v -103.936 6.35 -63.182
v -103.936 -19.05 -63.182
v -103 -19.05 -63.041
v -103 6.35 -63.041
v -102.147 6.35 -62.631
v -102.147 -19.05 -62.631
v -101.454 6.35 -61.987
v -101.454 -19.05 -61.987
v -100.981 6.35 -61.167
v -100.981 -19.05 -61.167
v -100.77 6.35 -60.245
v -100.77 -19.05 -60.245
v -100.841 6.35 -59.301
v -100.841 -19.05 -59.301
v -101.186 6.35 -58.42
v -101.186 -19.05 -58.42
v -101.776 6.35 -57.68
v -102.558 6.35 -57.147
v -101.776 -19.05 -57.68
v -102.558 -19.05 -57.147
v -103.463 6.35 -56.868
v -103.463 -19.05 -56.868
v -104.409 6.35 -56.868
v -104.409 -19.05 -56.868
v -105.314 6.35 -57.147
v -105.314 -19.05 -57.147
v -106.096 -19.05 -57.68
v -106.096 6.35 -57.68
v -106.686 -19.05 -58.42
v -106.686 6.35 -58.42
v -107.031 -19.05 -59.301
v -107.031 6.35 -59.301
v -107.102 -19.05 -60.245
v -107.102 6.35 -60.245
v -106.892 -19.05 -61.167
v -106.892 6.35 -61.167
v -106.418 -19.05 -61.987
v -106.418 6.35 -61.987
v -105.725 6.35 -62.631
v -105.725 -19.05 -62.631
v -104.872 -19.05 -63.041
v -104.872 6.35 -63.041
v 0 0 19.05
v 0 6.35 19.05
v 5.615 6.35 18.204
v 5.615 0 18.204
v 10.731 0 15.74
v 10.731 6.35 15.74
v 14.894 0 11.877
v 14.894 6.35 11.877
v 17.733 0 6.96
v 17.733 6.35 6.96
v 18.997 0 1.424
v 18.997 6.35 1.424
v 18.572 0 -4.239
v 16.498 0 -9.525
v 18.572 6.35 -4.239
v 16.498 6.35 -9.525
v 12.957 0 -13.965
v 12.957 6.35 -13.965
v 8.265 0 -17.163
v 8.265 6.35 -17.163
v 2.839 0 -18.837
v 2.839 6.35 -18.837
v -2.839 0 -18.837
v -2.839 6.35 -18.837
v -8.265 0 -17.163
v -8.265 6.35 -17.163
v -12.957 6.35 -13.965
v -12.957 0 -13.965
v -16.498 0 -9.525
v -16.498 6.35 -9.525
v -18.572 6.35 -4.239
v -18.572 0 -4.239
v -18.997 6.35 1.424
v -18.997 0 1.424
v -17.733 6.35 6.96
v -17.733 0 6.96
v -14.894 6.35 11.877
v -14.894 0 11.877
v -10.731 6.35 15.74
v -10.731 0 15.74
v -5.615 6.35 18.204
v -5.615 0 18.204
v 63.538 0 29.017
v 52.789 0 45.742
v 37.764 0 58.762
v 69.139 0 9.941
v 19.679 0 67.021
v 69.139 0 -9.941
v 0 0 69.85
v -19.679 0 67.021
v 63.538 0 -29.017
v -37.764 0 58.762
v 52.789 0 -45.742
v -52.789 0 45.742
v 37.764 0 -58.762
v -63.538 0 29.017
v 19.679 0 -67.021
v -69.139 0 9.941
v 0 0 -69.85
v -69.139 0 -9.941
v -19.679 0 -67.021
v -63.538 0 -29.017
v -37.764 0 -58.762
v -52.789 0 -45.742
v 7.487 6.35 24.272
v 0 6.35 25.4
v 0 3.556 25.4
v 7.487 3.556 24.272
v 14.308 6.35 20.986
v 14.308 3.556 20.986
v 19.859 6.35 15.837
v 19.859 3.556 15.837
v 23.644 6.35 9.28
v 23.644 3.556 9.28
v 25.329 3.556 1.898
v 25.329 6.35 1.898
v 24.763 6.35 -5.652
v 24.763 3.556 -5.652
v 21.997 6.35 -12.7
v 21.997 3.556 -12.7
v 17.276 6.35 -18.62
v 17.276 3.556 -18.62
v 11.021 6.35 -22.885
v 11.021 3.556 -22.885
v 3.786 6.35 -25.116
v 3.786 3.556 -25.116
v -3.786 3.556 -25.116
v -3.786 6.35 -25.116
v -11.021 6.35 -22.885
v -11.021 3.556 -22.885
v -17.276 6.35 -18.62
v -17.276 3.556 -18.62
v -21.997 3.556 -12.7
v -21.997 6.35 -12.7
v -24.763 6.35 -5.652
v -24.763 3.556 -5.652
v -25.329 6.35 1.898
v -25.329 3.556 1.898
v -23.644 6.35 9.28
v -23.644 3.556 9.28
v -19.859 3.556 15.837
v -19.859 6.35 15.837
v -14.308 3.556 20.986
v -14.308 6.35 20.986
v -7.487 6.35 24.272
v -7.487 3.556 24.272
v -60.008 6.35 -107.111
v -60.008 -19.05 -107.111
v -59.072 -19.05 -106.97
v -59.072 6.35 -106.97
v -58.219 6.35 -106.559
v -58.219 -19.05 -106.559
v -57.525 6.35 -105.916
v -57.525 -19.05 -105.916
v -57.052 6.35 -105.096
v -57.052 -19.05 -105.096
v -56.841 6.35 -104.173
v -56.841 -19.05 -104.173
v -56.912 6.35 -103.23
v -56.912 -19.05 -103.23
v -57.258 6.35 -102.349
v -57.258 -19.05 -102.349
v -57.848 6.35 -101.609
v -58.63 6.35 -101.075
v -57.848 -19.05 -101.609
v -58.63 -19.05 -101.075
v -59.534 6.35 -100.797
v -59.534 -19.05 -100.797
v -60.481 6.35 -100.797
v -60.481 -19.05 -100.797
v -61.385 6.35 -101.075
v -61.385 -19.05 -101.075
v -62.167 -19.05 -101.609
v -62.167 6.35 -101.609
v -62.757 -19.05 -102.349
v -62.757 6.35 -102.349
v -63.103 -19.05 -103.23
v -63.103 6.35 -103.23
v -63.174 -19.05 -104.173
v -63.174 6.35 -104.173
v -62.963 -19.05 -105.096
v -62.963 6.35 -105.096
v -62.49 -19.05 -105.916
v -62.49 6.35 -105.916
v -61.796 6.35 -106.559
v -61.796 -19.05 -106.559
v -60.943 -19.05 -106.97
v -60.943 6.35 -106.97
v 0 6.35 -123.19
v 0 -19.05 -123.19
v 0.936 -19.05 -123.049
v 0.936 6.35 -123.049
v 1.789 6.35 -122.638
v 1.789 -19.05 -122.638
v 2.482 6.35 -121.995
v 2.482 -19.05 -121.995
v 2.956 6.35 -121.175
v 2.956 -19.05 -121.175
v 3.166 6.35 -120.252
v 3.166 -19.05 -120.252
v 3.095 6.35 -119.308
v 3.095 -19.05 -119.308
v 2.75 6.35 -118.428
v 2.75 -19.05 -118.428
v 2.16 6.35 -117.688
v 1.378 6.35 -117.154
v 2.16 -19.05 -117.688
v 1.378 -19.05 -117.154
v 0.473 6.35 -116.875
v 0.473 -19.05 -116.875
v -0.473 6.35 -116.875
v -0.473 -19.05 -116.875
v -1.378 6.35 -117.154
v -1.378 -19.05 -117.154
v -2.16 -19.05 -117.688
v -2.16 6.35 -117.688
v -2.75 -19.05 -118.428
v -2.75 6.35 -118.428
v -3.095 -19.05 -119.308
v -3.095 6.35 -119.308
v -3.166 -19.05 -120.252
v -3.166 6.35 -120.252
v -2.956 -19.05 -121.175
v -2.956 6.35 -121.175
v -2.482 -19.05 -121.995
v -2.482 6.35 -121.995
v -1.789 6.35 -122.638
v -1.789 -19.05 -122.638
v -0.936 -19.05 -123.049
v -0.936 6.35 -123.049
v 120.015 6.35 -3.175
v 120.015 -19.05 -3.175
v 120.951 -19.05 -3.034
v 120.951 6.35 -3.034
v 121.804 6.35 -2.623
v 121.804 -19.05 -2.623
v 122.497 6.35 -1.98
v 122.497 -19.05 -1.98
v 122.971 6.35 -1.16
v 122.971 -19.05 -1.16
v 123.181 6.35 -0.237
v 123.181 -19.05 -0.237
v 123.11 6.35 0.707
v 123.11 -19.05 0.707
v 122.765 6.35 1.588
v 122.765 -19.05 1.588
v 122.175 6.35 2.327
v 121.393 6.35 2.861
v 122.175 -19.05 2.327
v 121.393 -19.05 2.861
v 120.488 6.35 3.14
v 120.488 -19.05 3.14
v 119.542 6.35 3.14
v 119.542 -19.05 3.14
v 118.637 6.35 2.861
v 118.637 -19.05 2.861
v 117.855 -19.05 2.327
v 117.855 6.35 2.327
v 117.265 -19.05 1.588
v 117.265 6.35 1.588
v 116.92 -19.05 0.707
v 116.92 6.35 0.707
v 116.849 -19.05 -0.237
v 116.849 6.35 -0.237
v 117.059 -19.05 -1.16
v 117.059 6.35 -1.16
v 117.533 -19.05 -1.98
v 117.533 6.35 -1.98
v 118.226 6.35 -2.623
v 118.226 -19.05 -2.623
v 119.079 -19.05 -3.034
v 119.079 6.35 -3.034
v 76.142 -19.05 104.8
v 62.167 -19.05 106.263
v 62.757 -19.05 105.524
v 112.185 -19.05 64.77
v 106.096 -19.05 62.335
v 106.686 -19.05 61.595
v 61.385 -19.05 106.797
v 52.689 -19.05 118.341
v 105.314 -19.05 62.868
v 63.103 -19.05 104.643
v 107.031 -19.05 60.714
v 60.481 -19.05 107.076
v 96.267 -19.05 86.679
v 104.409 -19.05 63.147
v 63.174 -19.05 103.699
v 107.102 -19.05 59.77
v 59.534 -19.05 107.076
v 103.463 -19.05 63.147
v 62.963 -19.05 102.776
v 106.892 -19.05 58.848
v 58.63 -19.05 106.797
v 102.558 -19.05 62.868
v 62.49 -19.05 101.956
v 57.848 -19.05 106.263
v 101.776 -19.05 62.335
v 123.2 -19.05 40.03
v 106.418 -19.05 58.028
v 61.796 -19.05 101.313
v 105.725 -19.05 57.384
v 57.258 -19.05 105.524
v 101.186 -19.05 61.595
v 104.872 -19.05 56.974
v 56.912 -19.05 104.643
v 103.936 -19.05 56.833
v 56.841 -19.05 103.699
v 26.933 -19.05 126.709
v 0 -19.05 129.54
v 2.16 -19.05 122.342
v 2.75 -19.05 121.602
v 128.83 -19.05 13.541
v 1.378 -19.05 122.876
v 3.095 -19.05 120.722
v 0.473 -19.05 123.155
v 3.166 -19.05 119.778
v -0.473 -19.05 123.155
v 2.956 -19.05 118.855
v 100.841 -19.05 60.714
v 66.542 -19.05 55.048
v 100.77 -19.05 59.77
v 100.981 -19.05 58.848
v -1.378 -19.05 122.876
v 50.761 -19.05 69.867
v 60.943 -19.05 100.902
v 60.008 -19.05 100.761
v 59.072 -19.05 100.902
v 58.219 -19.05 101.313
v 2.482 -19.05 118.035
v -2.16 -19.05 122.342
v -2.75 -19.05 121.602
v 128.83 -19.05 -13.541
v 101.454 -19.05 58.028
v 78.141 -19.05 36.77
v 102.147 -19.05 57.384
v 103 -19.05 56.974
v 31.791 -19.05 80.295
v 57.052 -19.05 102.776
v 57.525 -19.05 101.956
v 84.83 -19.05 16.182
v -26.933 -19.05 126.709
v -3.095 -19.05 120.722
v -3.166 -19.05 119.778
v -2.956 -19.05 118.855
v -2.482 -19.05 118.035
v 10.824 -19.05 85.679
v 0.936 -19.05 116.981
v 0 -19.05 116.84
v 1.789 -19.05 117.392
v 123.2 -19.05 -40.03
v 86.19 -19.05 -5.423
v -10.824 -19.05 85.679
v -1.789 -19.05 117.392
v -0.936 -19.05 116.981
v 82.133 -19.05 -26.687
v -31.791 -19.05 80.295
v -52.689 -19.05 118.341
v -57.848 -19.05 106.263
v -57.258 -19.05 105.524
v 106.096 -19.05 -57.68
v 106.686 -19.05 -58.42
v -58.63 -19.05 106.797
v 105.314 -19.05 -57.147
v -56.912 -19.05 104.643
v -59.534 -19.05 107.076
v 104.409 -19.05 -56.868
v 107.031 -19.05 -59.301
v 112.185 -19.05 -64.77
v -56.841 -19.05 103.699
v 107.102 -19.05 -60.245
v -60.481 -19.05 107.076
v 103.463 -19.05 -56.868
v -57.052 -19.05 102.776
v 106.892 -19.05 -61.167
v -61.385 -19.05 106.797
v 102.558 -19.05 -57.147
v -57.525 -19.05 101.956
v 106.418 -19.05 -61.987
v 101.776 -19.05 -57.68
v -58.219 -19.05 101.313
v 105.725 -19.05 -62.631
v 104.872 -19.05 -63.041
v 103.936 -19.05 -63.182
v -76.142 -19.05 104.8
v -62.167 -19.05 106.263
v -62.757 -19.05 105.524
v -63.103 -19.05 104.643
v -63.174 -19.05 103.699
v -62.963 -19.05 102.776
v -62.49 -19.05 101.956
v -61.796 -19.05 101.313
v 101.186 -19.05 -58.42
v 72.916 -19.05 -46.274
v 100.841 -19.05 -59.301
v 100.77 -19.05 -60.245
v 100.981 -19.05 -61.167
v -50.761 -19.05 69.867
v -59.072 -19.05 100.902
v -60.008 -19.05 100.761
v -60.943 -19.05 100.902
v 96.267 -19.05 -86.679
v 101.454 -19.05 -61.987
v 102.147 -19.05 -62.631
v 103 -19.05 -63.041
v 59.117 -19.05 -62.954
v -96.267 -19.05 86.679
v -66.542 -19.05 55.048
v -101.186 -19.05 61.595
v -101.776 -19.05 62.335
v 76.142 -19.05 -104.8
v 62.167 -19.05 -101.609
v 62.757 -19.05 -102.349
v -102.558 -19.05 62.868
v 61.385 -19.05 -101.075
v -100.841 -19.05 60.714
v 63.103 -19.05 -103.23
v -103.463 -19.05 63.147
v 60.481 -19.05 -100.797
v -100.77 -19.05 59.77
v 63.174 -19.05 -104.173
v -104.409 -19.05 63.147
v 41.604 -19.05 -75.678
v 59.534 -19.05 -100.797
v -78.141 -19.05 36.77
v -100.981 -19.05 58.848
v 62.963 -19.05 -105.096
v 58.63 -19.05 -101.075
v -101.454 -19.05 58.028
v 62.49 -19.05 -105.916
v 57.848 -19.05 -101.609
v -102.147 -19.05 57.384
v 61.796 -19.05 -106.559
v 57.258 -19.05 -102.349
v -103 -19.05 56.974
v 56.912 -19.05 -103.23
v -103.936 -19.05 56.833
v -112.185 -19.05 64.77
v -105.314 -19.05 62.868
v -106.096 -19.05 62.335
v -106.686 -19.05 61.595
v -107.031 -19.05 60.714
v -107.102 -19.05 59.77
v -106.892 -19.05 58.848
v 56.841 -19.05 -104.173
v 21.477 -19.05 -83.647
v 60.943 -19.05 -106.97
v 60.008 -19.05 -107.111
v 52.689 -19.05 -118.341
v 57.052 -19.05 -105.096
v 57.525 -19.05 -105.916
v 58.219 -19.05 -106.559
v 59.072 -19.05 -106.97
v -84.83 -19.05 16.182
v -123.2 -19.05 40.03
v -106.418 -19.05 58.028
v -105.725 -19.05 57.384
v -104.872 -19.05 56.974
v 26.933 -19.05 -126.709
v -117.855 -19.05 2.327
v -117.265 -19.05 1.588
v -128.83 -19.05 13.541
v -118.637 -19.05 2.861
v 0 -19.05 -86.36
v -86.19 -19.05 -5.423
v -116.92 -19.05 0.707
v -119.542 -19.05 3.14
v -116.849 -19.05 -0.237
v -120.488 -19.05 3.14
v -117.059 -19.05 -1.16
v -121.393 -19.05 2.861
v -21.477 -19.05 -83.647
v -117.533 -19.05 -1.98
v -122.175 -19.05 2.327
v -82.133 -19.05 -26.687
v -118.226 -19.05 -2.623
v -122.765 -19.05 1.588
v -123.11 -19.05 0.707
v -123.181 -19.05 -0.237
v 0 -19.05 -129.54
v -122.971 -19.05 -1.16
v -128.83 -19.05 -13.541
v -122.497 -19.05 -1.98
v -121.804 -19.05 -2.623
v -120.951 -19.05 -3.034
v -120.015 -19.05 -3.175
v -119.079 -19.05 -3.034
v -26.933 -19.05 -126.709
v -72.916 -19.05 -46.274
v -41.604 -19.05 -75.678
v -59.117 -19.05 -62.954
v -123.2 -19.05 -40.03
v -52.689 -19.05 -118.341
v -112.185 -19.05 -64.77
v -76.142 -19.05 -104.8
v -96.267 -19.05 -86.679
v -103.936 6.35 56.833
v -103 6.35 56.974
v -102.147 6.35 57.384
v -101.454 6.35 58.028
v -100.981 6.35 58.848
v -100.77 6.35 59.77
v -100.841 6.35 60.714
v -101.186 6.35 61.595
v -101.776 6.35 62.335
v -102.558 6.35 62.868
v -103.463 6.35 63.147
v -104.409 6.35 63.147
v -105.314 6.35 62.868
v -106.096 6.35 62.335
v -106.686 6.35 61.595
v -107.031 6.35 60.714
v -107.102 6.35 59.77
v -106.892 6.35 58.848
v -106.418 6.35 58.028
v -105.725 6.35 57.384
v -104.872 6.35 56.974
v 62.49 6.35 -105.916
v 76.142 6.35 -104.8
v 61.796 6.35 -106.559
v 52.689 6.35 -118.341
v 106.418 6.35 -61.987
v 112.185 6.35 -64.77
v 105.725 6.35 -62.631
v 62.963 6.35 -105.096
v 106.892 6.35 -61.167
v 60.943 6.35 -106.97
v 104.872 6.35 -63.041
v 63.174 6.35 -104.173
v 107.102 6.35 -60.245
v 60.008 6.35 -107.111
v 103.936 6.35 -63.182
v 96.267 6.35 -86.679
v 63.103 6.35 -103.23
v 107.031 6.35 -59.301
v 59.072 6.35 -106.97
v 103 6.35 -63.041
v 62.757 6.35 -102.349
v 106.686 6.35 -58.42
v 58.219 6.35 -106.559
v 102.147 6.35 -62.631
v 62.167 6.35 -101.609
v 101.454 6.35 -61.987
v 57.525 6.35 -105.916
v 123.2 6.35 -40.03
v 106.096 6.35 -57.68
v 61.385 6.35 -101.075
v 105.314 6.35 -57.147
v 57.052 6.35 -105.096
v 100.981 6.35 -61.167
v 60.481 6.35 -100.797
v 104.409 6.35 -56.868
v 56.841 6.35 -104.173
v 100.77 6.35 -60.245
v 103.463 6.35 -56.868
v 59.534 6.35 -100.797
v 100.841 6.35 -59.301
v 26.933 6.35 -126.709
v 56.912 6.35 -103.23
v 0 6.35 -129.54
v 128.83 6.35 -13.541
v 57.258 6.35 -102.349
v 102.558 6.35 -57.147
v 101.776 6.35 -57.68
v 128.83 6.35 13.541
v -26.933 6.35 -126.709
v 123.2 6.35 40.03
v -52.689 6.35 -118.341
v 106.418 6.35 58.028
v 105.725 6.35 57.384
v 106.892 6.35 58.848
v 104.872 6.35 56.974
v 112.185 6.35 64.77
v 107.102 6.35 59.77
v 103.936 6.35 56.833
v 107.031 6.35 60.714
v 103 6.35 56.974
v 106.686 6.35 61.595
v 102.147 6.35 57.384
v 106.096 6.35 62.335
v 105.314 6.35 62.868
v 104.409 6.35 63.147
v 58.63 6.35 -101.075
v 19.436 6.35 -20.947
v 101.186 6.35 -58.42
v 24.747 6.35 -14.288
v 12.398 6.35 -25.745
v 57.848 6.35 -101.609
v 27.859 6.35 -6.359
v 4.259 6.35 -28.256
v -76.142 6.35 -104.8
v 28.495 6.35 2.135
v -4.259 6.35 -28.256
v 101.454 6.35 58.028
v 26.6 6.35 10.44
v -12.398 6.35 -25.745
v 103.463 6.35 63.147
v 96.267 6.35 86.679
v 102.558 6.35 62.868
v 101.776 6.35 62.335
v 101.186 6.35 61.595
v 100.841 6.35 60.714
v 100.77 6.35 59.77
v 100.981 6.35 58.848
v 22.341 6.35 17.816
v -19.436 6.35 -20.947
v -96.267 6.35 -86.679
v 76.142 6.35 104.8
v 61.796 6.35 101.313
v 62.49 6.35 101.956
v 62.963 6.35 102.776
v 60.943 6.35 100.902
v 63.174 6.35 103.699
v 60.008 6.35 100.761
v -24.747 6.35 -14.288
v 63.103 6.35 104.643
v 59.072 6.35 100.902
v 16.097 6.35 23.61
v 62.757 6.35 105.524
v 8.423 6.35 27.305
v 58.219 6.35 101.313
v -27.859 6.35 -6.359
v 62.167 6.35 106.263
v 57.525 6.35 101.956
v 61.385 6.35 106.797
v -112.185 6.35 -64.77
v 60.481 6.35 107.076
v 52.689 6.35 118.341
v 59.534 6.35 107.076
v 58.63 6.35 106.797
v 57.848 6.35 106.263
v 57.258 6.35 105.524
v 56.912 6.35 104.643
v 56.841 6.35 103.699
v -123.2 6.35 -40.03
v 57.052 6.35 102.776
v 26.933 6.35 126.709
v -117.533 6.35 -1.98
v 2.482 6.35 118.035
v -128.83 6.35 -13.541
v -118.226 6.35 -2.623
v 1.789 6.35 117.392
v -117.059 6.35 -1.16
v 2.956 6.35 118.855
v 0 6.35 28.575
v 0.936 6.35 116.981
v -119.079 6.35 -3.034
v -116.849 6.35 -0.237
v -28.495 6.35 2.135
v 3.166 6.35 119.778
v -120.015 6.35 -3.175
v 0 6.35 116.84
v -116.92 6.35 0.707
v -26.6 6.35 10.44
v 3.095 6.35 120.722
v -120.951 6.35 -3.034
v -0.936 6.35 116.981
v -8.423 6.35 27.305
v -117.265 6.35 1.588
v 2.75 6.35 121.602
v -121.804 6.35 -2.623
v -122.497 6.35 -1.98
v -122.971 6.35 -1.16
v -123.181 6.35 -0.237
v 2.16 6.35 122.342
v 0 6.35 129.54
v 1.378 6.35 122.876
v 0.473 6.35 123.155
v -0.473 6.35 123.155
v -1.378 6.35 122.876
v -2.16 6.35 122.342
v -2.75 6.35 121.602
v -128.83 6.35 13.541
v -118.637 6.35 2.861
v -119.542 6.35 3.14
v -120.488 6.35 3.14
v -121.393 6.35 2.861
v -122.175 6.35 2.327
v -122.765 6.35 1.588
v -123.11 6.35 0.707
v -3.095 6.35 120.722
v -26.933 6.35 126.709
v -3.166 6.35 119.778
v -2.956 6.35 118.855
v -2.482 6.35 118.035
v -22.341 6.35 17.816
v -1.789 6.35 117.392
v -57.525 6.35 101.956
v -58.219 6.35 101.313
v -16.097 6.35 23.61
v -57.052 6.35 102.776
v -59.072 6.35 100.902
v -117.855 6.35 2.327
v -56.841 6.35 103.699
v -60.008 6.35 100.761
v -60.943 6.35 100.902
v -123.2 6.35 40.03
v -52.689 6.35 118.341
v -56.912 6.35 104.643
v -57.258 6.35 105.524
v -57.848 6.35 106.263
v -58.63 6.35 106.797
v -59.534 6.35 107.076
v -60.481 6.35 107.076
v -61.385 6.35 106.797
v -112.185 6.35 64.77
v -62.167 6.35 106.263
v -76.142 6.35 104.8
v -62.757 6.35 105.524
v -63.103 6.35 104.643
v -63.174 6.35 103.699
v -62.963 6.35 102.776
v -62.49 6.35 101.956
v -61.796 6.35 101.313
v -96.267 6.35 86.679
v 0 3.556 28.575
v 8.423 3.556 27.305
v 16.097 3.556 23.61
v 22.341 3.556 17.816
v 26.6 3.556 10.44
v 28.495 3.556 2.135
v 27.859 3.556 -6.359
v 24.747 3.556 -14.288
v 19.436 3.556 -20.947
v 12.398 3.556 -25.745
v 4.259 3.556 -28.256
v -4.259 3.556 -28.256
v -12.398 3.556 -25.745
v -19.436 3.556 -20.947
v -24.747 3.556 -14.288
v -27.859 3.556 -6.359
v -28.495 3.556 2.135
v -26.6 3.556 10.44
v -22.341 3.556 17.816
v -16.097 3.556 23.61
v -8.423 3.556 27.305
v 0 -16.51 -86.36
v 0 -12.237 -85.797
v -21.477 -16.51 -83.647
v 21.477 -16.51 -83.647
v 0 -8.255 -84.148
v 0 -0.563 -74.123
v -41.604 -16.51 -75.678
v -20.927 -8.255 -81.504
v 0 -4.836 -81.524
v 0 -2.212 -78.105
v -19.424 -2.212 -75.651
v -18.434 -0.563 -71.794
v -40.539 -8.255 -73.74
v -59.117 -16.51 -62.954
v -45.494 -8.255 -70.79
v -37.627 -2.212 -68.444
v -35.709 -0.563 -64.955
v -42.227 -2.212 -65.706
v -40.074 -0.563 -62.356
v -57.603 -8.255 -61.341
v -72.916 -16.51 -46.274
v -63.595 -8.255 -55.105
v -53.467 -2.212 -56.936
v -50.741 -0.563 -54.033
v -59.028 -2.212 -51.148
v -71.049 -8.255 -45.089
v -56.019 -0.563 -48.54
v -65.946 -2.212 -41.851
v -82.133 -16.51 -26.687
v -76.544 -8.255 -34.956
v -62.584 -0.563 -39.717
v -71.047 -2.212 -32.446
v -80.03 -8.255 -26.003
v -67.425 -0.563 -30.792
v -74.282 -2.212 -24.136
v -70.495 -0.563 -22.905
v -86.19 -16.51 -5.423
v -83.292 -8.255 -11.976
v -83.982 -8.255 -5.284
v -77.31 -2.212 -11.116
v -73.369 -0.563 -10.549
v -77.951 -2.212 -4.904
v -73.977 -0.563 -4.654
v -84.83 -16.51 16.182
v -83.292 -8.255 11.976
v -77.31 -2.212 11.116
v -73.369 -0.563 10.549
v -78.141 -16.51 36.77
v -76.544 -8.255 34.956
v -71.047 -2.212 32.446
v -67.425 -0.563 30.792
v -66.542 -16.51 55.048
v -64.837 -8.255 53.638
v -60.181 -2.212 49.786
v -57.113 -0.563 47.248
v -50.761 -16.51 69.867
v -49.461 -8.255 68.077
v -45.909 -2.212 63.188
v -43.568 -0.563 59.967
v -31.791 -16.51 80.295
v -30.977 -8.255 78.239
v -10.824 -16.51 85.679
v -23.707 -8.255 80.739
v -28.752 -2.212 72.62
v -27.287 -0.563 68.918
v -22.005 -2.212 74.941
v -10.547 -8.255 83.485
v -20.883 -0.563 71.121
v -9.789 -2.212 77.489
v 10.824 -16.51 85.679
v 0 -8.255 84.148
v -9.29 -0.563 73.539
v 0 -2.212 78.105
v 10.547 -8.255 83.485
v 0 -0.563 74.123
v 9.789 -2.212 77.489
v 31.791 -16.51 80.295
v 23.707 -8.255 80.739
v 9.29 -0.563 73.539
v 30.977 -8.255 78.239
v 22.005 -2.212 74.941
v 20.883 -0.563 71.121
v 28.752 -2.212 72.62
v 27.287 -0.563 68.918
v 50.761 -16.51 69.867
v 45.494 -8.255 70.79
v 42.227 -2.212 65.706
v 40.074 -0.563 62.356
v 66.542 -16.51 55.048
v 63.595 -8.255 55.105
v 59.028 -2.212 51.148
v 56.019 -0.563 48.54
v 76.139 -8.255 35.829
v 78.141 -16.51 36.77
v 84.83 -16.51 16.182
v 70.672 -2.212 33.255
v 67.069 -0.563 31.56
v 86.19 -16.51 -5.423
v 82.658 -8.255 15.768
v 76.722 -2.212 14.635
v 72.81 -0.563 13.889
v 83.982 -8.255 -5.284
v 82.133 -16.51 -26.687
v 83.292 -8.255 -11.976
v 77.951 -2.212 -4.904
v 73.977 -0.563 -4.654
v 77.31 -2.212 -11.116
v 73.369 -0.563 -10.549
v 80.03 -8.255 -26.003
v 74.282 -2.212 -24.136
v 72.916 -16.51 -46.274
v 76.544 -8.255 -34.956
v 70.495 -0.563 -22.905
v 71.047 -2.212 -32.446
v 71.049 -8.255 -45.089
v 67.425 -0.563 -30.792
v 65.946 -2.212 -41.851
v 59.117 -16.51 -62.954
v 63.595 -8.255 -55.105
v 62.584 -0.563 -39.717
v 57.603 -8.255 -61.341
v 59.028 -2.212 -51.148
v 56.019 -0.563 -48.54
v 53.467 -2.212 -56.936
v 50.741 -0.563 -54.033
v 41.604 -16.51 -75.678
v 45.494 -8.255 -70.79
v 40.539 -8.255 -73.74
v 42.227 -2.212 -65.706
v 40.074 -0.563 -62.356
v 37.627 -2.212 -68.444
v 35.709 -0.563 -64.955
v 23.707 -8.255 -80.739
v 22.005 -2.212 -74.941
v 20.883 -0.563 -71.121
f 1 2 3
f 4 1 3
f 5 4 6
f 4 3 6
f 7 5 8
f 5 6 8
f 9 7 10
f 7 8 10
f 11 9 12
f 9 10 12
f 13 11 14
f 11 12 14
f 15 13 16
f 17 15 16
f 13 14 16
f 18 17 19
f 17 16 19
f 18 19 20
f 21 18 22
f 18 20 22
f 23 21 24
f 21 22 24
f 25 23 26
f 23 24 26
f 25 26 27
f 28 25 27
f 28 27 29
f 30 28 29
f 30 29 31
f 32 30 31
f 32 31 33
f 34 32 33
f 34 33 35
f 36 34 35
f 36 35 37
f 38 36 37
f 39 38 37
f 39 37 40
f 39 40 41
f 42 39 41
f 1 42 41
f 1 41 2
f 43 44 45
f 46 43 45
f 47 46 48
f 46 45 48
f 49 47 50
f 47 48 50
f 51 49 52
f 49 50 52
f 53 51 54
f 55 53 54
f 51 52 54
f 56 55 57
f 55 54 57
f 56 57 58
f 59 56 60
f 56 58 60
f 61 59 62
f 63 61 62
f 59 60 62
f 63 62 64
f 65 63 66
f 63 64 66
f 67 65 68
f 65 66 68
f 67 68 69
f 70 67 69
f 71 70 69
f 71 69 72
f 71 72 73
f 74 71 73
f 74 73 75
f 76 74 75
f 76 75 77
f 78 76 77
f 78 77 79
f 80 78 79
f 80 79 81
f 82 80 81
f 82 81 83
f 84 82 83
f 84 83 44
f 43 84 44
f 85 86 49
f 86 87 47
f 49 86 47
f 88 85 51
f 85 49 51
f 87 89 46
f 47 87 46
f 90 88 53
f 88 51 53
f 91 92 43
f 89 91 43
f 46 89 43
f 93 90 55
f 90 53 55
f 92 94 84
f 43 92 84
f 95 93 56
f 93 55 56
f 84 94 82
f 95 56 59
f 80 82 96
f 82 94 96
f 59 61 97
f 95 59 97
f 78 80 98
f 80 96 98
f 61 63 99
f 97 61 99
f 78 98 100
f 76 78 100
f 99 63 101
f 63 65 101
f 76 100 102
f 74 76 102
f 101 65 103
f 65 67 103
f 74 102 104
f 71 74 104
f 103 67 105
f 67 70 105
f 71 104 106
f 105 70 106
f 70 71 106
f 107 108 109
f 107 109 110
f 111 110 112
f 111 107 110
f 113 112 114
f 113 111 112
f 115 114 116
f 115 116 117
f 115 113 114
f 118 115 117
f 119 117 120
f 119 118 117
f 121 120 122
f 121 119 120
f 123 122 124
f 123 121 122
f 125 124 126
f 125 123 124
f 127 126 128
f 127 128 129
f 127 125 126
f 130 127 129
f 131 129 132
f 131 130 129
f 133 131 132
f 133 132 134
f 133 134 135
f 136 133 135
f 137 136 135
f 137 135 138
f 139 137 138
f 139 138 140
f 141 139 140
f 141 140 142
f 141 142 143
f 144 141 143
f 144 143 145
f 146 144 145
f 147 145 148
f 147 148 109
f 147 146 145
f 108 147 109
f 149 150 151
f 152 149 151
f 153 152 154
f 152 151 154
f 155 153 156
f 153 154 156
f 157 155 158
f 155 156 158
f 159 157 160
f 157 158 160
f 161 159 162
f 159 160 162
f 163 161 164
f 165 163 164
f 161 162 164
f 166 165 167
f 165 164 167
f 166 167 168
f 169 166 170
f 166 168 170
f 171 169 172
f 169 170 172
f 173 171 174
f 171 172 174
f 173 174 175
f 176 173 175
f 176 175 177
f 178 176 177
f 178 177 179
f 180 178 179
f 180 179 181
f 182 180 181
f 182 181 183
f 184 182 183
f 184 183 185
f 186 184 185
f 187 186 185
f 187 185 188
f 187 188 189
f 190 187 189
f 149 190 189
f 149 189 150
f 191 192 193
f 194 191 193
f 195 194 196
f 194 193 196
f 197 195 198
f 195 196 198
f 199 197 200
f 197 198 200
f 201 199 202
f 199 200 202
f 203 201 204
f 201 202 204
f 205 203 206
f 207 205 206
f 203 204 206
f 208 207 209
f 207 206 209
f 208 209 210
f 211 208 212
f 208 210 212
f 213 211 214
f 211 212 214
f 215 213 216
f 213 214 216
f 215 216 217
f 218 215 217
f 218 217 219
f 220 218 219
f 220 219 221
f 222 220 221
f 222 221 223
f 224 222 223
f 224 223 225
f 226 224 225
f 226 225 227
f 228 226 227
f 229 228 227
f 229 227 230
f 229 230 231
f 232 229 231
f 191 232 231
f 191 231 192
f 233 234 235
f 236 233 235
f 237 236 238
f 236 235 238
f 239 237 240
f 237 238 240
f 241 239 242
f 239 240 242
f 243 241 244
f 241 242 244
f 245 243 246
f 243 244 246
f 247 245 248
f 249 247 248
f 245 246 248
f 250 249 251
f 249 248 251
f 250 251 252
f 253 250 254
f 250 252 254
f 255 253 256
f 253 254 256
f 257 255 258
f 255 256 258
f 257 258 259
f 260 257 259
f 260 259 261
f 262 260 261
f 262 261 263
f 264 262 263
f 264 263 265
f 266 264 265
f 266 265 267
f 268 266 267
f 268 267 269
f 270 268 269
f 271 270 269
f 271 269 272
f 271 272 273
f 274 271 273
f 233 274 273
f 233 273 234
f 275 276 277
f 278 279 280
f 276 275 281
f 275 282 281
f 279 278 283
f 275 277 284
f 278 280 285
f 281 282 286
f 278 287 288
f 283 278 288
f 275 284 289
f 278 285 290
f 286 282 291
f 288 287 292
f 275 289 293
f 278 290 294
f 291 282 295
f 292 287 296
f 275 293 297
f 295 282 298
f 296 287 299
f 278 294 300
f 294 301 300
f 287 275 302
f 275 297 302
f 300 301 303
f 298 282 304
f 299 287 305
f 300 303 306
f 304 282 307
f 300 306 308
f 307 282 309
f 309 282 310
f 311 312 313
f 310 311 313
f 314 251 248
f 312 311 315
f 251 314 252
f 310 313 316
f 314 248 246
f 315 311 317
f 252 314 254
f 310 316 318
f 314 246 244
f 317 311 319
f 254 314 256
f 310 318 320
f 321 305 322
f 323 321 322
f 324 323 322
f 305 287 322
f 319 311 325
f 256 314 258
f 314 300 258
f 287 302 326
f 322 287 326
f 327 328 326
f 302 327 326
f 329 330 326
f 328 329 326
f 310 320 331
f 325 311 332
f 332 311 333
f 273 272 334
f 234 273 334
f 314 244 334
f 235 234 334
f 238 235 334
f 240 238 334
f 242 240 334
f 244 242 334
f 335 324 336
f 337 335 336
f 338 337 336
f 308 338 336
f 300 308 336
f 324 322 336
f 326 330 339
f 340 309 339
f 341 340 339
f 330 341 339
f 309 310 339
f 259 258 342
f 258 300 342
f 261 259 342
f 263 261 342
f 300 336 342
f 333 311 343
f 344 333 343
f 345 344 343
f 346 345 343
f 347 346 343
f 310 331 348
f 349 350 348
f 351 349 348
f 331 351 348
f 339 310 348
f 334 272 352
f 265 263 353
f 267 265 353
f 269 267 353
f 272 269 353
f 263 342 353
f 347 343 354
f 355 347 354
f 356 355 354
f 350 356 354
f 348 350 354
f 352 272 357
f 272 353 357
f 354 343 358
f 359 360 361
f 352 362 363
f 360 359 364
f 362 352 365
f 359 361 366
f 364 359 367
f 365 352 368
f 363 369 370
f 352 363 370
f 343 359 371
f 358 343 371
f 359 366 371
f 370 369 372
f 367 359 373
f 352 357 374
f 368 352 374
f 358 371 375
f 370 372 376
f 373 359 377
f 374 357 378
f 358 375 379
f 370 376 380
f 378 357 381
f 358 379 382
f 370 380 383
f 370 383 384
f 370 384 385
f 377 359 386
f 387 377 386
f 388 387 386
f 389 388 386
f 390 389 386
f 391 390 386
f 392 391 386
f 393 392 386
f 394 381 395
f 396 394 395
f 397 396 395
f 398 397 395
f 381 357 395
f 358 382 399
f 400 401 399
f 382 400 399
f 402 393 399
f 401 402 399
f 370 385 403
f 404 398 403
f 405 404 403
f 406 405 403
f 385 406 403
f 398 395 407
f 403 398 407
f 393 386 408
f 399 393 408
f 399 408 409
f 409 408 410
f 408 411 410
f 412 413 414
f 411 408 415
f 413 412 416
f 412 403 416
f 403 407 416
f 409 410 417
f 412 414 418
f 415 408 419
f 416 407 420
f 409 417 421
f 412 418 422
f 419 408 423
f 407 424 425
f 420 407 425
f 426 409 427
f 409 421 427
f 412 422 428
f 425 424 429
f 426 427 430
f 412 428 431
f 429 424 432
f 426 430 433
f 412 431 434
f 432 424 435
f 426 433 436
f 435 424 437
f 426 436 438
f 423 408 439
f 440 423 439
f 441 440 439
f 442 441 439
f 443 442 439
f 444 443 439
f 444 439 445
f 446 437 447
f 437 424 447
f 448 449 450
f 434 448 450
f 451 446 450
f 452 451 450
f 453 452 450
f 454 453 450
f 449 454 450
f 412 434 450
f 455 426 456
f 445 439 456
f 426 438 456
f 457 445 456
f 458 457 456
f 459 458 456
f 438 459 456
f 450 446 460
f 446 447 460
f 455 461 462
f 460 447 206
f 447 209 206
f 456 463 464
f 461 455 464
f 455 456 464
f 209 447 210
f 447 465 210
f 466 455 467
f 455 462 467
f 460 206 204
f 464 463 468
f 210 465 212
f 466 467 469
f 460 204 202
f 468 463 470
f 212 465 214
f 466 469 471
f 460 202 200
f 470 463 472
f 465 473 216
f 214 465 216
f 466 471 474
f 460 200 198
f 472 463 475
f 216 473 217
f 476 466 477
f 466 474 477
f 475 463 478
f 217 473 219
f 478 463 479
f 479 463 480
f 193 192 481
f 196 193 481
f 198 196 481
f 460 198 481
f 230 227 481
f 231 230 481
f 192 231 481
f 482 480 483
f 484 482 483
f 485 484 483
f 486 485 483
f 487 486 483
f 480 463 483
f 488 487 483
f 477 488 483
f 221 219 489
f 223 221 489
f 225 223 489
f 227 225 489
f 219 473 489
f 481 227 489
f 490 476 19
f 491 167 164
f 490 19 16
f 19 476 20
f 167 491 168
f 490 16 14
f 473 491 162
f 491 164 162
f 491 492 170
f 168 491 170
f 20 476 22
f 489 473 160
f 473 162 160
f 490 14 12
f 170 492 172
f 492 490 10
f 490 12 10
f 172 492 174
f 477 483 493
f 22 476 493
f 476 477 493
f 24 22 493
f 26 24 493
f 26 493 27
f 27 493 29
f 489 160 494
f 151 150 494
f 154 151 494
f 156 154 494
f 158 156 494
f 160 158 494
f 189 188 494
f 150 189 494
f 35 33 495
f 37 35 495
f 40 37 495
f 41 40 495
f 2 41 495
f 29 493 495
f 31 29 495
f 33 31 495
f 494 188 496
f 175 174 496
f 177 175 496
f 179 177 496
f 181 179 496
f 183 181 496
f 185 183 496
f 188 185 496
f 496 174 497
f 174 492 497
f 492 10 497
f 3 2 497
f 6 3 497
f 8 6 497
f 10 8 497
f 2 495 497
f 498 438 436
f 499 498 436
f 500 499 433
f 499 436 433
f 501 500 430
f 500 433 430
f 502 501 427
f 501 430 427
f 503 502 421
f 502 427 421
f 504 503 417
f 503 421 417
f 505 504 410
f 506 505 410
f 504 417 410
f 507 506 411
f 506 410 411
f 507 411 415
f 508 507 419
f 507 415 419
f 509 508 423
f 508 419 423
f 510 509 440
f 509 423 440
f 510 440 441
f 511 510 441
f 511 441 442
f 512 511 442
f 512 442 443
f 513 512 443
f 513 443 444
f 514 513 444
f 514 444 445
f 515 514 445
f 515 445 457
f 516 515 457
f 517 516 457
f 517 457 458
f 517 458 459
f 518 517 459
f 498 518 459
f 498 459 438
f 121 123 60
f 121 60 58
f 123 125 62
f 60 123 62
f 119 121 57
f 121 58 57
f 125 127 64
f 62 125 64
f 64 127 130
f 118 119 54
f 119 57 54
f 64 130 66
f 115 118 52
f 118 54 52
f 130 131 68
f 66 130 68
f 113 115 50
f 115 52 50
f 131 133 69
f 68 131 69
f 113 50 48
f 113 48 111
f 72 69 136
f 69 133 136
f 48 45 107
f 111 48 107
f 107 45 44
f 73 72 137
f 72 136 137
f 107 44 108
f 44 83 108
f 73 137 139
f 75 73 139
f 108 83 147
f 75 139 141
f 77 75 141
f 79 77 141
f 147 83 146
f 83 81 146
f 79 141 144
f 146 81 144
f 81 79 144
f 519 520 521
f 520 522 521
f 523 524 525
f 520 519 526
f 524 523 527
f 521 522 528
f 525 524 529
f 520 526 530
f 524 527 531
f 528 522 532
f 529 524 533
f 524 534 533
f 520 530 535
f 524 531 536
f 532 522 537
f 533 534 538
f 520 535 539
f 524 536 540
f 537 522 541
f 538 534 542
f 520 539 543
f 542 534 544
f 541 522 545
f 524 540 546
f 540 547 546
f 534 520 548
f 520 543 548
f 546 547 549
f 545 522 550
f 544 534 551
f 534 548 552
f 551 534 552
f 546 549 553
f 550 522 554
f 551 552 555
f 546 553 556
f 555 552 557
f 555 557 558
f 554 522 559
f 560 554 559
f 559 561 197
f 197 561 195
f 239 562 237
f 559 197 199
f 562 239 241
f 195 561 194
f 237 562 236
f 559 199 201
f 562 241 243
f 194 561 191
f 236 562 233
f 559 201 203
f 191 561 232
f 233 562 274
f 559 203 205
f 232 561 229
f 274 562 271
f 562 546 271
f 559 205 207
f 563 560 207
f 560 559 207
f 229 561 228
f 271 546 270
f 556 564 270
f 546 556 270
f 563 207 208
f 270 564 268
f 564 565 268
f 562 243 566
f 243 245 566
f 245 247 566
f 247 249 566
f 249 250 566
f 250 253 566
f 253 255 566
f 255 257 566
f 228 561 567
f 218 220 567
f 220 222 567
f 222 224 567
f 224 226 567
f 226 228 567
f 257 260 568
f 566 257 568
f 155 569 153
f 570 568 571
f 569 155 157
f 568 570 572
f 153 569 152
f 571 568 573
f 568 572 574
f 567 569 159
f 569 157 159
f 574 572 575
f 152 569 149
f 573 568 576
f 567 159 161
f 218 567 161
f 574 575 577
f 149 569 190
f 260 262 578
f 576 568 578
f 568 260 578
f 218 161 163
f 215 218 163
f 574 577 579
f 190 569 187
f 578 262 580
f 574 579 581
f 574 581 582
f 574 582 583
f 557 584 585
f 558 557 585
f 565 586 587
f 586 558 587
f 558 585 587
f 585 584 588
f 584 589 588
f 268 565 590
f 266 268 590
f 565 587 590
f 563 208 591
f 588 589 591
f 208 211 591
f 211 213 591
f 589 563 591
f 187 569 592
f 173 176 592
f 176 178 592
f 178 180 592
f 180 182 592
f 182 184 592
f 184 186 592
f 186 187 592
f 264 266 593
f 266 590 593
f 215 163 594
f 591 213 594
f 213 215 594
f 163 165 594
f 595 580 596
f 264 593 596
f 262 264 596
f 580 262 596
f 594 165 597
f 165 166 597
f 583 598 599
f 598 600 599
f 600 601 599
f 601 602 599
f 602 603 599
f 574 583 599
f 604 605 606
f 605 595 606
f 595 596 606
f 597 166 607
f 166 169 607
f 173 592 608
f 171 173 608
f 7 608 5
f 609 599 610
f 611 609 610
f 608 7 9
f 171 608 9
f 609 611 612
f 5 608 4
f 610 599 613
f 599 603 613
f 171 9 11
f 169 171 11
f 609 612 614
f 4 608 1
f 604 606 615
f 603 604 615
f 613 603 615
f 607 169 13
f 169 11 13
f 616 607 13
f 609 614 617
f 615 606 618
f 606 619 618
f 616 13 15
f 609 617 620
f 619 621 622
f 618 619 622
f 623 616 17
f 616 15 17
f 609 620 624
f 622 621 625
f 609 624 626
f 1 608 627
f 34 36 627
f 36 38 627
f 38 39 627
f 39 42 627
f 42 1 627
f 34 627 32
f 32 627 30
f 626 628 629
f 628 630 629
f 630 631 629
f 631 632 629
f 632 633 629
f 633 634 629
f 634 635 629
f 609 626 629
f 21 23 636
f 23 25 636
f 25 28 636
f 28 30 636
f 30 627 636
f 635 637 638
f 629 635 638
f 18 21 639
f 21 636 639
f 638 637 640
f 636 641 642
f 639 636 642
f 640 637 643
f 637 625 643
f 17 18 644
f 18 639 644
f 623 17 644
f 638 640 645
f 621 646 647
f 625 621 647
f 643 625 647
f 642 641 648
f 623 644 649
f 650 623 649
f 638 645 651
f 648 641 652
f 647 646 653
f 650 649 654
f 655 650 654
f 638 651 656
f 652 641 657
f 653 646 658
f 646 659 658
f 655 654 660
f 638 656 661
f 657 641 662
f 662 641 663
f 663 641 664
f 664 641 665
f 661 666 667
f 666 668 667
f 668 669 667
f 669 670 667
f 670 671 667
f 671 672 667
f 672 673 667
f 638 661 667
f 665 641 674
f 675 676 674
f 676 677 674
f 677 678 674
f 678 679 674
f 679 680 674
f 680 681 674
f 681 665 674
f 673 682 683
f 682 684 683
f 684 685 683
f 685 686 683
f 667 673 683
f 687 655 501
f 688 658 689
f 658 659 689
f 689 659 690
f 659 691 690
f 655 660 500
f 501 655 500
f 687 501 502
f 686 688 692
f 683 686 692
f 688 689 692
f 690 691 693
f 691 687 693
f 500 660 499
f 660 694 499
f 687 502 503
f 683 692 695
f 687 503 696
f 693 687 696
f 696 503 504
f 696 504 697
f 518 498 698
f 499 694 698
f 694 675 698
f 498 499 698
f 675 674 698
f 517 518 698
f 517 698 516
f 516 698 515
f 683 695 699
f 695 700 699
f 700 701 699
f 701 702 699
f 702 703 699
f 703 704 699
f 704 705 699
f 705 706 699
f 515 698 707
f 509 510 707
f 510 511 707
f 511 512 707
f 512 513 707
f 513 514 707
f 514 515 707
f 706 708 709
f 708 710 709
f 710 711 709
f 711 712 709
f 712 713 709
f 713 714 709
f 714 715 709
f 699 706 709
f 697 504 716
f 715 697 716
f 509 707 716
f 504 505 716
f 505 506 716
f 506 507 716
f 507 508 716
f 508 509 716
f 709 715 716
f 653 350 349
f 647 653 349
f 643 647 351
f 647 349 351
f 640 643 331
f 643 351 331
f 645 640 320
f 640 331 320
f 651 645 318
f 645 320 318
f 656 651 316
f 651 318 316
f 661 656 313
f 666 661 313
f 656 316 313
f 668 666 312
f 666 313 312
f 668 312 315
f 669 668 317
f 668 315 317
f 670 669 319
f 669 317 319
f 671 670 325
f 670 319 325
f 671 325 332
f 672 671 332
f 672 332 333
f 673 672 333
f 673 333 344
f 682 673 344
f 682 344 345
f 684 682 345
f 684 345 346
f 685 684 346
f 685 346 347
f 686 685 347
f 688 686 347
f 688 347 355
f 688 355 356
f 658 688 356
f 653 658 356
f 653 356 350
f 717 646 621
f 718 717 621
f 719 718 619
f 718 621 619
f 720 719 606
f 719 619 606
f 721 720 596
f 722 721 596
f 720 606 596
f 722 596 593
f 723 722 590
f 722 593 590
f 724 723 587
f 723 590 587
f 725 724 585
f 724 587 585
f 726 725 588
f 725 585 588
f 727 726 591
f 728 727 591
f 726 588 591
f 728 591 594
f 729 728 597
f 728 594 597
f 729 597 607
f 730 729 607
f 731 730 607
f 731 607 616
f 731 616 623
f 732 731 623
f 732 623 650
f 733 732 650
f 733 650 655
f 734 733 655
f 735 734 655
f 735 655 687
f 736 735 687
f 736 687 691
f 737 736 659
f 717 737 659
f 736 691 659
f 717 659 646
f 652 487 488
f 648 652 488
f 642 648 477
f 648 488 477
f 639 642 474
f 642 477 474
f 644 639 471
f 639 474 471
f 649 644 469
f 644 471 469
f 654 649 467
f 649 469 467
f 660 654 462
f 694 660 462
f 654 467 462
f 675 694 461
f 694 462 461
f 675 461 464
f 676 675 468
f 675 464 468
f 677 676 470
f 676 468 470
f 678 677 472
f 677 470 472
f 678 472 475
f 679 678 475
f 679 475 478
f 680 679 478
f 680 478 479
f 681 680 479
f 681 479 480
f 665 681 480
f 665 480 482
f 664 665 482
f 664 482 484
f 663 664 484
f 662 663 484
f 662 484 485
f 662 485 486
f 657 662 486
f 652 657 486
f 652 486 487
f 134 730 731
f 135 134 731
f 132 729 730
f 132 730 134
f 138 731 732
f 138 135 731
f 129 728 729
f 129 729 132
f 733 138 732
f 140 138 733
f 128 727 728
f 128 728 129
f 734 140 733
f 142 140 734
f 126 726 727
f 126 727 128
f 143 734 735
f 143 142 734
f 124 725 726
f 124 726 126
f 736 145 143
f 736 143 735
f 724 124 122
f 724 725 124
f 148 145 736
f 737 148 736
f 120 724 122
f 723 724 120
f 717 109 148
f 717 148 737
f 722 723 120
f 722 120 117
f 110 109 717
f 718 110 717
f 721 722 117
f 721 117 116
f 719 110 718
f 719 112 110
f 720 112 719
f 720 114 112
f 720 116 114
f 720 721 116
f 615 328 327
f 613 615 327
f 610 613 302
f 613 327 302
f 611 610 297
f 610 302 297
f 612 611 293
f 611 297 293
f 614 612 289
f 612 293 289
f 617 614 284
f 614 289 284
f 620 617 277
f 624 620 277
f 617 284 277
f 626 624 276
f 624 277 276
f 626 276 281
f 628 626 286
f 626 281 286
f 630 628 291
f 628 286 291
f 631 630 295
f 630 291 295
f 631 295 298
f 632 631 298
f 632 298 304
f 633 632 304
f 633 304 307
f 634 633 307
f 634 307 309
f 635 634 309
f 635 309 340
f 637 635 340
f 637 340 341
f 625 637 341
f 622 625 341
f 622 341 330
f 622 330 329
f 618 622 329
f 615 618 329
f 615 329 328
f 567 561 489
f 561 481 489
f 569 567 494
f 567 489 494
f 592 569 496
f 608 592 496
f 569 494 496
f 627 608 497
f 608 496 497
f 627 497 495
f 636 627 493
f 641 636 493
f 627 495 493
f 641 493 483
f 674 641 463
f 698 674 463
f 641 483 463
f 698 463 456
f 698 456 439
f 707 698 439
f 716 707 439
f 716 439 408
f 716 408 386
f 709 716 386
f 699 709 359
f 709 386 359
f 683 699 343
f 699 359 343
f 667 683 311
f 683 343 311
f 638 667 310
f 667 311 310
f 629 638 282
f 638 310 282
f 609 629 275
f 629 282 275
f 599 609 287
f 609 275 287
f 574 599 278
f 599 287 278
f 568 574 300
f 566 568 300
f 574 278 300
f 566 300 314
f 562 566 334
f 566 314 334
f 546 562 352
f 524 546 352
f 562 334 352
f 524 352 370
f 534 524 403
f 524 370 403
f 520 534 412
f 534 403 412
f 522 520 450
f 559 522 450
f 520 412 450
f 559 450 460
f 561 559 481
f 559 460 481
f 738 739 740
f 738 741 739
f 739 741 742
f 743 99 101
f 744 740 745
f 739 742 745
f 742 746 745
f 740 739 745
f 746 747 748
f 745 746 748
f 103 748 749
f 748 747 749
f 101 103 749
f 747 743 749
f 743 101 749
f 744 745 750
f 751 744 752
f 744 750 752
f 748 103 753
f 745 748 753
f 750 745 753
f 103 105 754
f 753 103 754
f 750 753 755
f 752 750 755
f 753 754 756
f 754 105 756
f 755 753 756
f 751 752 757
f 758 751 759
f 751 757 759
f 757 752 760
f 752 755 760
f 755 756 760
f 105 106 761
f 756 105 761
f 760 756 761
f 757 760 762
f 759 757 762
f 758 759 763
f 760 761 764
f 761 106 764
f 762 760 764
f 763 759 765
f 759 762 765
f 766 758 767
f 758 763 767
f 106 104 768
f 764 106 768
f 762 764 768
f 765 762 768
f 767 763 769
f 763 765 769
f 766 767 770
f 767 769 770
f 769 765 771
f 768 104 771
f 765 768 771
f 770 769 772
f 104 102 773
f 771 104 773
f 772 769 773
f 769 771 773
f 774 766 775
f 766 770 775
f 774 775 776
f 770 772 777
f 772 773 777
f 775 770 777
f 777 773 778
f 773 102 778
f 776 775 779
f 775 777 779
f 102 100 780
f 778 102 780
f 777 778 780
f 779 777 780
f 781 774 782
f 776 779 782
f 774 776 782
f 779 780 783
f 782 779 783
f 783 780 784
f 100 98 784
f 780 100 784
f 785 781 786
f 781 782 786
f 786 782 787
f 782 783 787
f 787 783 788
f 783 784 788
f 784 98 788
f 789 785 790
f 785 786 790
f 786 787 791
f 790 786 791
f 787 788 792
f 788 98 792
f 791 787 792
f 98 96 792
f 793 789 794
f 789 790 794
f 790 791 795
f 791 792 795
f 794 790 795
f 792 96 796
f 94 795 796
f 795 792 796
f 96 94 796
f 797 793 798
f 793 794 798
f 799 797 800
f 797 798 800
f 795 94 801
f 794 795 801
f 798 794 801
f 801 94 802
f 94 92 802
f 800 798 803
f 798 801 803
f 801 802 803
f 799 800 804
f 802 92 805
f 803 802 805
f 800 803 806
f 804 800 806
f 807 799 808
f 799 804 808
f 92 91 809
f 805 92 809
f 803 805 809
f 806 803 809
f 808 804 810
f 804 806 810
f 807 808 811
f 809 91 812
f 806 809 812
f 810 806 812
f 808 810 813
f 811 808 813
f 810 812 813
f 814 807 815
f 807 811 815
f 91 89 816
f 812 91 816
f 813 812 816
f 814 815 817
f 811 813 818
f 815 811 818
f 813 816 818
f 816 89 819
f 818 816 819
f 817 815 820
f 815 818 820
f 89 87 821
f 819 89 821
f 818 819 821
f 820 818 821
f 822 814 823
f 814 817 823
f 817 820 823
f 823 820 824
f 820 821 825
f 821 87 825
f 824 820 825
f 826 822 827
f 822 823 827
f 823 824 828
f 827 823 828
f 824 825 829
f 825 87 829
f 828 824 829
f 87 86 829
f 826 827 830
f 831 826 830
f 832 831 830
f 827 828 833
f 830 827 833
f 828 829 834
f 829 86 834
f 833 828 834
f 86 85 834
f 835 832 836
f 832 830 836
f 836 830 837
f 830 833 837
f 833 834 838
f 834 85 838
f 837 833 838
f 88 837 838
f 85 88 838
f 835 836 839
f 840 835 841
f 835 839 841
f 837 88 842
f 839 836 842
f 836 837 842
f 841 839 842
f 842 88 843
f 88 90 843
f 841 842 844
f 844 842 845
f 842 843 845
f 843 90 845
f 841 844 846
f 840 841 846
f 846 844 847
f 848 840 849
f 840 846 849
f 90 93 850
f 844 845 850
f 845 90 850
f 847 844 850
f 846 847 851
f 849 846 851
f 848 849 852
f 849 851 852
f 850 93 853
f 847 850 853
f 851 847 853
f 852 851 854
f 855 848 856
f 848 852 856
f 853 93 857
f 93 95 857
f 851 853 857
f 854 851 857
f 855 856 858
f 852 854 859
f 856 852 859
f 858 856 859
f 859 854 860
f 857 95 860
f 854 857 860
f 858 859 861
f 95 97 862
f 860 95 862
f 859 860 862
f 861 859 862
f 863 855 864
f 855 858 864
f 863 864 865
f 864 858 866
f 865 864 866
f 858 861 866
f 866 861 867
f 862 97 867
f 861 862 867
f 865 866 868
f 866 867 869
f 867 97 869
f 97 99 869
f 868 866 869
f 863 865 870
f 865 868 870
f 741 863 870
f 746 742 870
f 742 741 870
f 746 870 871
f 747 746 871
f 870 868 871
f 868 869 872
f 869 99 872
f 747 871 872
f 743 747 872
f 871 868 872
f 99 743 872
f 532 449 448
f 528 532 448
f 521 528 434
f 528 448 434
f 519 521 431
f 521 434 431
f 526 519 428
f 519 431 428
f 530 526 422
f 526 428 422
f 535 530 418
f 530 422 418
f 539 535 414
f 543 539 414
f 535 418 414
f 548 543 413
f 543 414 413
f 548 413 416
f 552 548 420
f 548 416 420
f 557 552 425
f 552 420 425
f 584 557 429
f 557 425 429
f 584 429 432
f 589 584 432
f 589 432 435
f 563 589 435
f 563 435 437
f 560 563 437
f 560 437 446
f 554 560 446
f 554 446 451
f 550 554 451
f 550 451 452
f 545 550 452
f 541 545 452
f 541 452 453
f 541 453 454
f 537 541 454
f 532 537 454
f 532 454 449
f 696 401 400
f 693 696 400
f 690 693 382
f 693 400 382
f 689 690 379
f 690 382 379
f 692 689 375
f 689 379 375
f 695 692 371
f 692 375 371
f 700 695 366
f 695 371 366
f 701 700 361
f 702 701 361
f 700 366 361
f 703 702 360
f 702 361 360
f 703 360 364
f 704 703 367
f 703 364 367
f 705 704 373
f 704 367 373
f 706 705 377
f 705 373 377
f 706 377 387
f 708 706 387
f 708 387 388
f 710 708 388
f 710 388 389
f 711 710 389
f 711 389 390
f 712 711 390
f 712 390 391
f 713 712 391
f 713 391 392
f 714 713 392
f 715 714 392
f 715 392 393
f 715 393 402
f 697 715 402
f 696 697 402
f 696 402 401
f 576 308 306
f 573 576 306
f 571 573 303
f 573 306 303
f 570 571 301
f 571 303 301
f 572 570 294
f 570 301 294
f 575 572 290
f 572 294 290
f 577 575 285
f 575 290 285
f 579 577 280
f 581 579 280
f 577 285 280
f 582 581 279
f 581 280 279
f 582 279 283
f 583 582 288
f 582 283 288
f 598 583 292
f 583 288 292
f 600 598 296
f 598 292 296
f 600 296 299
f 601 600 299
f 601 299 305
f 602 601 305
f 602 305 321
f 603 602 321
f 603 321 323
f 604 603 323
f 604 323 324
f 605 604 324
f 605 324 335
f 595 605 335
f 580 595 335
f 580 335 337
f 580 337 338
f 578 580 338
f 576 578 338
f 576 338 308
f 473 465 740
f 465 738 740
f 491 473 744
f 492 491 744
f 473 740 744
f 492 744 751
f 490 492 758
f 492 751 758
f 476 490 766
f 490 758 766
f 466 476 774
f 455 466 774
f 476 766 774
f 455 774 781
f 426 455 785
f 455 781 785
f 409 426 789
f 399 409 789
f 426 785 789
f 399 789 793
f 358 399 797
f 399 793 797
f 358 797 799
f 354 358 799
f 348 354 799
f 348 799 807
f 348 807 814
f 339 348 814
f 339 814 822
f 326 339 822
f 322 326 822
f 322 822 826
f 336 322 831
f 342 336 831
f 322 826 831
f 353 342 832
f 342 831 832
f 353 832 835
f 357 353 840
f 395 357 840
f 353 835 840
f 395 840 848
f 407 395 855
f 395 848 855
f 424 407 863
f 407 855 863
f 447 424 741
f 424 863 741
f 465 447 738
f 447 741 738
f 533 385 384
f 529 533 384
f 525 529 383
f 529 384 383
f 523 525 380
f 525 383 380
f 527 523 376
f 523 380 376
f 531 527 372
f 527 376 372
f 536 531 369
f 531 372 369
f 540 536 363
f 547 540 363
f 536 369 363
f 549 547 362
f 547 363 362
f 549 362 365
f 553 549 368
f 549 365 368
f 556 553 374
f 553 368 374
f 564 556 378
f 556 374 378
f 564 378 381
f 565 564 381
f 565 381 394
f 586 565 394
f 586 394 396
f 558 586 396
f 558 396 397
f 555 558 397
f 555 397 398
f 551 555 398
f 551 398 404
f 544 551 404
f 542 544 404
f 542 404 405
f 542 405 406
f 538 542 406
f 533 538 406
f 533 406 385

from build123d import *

# Parameters (mm, degrees)
SKETCH2_R                   = 19.05
CUT_EXTRUDE1_DEPTH          = 185.94967748
SKETCH3_R                   = 28.575
SKETCH3_R_2                 = 25.4
CUT_EXTRUDE2_DEPTH          = 2.794
F_1_4_0_25_DIAMETER_HOLE1_D = 6.35


with BuildPart() as part:
    # Sketch1 → Revolve1 (revolve)
    with BuildSketch(Plane.XY, mode=Mode.PRIVATE) as revolve1_sk:
        with BuildLine():
            Line((0, 0), (0, 6.35))
            Line((0, 6.35), (-129.54, 6.35))
            Line((-129.54, 6.35), (-129.54, -19.05))
            Line((-129.54, -19.05), (-86.36, -19.05))
            Line((-86.36, -19.05), (-86.36, -16.51))
            ThreePointArc((-86.36, -16.51), (-81.524332957, -4.835667043), (-69.85, 0))
            Line((-69.85, 0), (0, 0))
        make_face()
    revolve(revolve1_sk.sketch.rotate(Axis((0, 0, 0), (0, 1, 0)), 270), axis=Axis((0, 0, 0), (0, 1, 0)))

    # Sketch2 → Cut-Extrude1 (cut, through all)
    with BuildSketch(Plane(origin=(0, 6.35, 0), x_dir=(1, 0, 0), z_dir=(0, 1, 0))):
        with Locations(Location((0, 0, 0), (0, 0, 270))):
            Circle(SKETCH2_R)
    extrude(amount=-CUT_EXTRUDE1_DEPTH, mode=Mode.SUBTRACT)

    # Sketch3 → Cut-Extrude2 (cut)
    with BuildSketch(Plane(origin=(0, 6.35, 0), x_dir=(1, 0, 0), z_dir=(0, 1, 0))):
        with Locations(Location((0, 0, 0), (0, 0, 270))):
            Circle(SKETCH3_R)
        with Locations(Location((0, 0, 0), (0, 0, 270))):
            Circle(SKETCH3_R_2, mode=Mode.SUBTRACT)
    extrude(amount=-CUT_EXTRUDE2_DEPTH, mode=Mode.SUBTRACT)

    # 1/4 (0.25) Diameter Hole1 (through all)
    with Locations(Plane(origin=(0, 6.35, -120.015), x_dir=(0, 0, 1), z_dir=(0, 1, 0))):
        with Locations((0, 0), (16.078961165, -60.0075), (60.0075, -103.936038835), (120.015, -120.015), (180.0225, -103.936038835), (223.951038835, -60.0075), (240.03, 0), (223.951038835, 60.0075), (180.0225, 103.936038835), (120.015, 120.015), (60.0075, 103.936038835), (16.078961165, 60.0075)):
            Hole(F_1_4_0_25_DIAMETER_HOLE1_D / 2)


solid = part.part
